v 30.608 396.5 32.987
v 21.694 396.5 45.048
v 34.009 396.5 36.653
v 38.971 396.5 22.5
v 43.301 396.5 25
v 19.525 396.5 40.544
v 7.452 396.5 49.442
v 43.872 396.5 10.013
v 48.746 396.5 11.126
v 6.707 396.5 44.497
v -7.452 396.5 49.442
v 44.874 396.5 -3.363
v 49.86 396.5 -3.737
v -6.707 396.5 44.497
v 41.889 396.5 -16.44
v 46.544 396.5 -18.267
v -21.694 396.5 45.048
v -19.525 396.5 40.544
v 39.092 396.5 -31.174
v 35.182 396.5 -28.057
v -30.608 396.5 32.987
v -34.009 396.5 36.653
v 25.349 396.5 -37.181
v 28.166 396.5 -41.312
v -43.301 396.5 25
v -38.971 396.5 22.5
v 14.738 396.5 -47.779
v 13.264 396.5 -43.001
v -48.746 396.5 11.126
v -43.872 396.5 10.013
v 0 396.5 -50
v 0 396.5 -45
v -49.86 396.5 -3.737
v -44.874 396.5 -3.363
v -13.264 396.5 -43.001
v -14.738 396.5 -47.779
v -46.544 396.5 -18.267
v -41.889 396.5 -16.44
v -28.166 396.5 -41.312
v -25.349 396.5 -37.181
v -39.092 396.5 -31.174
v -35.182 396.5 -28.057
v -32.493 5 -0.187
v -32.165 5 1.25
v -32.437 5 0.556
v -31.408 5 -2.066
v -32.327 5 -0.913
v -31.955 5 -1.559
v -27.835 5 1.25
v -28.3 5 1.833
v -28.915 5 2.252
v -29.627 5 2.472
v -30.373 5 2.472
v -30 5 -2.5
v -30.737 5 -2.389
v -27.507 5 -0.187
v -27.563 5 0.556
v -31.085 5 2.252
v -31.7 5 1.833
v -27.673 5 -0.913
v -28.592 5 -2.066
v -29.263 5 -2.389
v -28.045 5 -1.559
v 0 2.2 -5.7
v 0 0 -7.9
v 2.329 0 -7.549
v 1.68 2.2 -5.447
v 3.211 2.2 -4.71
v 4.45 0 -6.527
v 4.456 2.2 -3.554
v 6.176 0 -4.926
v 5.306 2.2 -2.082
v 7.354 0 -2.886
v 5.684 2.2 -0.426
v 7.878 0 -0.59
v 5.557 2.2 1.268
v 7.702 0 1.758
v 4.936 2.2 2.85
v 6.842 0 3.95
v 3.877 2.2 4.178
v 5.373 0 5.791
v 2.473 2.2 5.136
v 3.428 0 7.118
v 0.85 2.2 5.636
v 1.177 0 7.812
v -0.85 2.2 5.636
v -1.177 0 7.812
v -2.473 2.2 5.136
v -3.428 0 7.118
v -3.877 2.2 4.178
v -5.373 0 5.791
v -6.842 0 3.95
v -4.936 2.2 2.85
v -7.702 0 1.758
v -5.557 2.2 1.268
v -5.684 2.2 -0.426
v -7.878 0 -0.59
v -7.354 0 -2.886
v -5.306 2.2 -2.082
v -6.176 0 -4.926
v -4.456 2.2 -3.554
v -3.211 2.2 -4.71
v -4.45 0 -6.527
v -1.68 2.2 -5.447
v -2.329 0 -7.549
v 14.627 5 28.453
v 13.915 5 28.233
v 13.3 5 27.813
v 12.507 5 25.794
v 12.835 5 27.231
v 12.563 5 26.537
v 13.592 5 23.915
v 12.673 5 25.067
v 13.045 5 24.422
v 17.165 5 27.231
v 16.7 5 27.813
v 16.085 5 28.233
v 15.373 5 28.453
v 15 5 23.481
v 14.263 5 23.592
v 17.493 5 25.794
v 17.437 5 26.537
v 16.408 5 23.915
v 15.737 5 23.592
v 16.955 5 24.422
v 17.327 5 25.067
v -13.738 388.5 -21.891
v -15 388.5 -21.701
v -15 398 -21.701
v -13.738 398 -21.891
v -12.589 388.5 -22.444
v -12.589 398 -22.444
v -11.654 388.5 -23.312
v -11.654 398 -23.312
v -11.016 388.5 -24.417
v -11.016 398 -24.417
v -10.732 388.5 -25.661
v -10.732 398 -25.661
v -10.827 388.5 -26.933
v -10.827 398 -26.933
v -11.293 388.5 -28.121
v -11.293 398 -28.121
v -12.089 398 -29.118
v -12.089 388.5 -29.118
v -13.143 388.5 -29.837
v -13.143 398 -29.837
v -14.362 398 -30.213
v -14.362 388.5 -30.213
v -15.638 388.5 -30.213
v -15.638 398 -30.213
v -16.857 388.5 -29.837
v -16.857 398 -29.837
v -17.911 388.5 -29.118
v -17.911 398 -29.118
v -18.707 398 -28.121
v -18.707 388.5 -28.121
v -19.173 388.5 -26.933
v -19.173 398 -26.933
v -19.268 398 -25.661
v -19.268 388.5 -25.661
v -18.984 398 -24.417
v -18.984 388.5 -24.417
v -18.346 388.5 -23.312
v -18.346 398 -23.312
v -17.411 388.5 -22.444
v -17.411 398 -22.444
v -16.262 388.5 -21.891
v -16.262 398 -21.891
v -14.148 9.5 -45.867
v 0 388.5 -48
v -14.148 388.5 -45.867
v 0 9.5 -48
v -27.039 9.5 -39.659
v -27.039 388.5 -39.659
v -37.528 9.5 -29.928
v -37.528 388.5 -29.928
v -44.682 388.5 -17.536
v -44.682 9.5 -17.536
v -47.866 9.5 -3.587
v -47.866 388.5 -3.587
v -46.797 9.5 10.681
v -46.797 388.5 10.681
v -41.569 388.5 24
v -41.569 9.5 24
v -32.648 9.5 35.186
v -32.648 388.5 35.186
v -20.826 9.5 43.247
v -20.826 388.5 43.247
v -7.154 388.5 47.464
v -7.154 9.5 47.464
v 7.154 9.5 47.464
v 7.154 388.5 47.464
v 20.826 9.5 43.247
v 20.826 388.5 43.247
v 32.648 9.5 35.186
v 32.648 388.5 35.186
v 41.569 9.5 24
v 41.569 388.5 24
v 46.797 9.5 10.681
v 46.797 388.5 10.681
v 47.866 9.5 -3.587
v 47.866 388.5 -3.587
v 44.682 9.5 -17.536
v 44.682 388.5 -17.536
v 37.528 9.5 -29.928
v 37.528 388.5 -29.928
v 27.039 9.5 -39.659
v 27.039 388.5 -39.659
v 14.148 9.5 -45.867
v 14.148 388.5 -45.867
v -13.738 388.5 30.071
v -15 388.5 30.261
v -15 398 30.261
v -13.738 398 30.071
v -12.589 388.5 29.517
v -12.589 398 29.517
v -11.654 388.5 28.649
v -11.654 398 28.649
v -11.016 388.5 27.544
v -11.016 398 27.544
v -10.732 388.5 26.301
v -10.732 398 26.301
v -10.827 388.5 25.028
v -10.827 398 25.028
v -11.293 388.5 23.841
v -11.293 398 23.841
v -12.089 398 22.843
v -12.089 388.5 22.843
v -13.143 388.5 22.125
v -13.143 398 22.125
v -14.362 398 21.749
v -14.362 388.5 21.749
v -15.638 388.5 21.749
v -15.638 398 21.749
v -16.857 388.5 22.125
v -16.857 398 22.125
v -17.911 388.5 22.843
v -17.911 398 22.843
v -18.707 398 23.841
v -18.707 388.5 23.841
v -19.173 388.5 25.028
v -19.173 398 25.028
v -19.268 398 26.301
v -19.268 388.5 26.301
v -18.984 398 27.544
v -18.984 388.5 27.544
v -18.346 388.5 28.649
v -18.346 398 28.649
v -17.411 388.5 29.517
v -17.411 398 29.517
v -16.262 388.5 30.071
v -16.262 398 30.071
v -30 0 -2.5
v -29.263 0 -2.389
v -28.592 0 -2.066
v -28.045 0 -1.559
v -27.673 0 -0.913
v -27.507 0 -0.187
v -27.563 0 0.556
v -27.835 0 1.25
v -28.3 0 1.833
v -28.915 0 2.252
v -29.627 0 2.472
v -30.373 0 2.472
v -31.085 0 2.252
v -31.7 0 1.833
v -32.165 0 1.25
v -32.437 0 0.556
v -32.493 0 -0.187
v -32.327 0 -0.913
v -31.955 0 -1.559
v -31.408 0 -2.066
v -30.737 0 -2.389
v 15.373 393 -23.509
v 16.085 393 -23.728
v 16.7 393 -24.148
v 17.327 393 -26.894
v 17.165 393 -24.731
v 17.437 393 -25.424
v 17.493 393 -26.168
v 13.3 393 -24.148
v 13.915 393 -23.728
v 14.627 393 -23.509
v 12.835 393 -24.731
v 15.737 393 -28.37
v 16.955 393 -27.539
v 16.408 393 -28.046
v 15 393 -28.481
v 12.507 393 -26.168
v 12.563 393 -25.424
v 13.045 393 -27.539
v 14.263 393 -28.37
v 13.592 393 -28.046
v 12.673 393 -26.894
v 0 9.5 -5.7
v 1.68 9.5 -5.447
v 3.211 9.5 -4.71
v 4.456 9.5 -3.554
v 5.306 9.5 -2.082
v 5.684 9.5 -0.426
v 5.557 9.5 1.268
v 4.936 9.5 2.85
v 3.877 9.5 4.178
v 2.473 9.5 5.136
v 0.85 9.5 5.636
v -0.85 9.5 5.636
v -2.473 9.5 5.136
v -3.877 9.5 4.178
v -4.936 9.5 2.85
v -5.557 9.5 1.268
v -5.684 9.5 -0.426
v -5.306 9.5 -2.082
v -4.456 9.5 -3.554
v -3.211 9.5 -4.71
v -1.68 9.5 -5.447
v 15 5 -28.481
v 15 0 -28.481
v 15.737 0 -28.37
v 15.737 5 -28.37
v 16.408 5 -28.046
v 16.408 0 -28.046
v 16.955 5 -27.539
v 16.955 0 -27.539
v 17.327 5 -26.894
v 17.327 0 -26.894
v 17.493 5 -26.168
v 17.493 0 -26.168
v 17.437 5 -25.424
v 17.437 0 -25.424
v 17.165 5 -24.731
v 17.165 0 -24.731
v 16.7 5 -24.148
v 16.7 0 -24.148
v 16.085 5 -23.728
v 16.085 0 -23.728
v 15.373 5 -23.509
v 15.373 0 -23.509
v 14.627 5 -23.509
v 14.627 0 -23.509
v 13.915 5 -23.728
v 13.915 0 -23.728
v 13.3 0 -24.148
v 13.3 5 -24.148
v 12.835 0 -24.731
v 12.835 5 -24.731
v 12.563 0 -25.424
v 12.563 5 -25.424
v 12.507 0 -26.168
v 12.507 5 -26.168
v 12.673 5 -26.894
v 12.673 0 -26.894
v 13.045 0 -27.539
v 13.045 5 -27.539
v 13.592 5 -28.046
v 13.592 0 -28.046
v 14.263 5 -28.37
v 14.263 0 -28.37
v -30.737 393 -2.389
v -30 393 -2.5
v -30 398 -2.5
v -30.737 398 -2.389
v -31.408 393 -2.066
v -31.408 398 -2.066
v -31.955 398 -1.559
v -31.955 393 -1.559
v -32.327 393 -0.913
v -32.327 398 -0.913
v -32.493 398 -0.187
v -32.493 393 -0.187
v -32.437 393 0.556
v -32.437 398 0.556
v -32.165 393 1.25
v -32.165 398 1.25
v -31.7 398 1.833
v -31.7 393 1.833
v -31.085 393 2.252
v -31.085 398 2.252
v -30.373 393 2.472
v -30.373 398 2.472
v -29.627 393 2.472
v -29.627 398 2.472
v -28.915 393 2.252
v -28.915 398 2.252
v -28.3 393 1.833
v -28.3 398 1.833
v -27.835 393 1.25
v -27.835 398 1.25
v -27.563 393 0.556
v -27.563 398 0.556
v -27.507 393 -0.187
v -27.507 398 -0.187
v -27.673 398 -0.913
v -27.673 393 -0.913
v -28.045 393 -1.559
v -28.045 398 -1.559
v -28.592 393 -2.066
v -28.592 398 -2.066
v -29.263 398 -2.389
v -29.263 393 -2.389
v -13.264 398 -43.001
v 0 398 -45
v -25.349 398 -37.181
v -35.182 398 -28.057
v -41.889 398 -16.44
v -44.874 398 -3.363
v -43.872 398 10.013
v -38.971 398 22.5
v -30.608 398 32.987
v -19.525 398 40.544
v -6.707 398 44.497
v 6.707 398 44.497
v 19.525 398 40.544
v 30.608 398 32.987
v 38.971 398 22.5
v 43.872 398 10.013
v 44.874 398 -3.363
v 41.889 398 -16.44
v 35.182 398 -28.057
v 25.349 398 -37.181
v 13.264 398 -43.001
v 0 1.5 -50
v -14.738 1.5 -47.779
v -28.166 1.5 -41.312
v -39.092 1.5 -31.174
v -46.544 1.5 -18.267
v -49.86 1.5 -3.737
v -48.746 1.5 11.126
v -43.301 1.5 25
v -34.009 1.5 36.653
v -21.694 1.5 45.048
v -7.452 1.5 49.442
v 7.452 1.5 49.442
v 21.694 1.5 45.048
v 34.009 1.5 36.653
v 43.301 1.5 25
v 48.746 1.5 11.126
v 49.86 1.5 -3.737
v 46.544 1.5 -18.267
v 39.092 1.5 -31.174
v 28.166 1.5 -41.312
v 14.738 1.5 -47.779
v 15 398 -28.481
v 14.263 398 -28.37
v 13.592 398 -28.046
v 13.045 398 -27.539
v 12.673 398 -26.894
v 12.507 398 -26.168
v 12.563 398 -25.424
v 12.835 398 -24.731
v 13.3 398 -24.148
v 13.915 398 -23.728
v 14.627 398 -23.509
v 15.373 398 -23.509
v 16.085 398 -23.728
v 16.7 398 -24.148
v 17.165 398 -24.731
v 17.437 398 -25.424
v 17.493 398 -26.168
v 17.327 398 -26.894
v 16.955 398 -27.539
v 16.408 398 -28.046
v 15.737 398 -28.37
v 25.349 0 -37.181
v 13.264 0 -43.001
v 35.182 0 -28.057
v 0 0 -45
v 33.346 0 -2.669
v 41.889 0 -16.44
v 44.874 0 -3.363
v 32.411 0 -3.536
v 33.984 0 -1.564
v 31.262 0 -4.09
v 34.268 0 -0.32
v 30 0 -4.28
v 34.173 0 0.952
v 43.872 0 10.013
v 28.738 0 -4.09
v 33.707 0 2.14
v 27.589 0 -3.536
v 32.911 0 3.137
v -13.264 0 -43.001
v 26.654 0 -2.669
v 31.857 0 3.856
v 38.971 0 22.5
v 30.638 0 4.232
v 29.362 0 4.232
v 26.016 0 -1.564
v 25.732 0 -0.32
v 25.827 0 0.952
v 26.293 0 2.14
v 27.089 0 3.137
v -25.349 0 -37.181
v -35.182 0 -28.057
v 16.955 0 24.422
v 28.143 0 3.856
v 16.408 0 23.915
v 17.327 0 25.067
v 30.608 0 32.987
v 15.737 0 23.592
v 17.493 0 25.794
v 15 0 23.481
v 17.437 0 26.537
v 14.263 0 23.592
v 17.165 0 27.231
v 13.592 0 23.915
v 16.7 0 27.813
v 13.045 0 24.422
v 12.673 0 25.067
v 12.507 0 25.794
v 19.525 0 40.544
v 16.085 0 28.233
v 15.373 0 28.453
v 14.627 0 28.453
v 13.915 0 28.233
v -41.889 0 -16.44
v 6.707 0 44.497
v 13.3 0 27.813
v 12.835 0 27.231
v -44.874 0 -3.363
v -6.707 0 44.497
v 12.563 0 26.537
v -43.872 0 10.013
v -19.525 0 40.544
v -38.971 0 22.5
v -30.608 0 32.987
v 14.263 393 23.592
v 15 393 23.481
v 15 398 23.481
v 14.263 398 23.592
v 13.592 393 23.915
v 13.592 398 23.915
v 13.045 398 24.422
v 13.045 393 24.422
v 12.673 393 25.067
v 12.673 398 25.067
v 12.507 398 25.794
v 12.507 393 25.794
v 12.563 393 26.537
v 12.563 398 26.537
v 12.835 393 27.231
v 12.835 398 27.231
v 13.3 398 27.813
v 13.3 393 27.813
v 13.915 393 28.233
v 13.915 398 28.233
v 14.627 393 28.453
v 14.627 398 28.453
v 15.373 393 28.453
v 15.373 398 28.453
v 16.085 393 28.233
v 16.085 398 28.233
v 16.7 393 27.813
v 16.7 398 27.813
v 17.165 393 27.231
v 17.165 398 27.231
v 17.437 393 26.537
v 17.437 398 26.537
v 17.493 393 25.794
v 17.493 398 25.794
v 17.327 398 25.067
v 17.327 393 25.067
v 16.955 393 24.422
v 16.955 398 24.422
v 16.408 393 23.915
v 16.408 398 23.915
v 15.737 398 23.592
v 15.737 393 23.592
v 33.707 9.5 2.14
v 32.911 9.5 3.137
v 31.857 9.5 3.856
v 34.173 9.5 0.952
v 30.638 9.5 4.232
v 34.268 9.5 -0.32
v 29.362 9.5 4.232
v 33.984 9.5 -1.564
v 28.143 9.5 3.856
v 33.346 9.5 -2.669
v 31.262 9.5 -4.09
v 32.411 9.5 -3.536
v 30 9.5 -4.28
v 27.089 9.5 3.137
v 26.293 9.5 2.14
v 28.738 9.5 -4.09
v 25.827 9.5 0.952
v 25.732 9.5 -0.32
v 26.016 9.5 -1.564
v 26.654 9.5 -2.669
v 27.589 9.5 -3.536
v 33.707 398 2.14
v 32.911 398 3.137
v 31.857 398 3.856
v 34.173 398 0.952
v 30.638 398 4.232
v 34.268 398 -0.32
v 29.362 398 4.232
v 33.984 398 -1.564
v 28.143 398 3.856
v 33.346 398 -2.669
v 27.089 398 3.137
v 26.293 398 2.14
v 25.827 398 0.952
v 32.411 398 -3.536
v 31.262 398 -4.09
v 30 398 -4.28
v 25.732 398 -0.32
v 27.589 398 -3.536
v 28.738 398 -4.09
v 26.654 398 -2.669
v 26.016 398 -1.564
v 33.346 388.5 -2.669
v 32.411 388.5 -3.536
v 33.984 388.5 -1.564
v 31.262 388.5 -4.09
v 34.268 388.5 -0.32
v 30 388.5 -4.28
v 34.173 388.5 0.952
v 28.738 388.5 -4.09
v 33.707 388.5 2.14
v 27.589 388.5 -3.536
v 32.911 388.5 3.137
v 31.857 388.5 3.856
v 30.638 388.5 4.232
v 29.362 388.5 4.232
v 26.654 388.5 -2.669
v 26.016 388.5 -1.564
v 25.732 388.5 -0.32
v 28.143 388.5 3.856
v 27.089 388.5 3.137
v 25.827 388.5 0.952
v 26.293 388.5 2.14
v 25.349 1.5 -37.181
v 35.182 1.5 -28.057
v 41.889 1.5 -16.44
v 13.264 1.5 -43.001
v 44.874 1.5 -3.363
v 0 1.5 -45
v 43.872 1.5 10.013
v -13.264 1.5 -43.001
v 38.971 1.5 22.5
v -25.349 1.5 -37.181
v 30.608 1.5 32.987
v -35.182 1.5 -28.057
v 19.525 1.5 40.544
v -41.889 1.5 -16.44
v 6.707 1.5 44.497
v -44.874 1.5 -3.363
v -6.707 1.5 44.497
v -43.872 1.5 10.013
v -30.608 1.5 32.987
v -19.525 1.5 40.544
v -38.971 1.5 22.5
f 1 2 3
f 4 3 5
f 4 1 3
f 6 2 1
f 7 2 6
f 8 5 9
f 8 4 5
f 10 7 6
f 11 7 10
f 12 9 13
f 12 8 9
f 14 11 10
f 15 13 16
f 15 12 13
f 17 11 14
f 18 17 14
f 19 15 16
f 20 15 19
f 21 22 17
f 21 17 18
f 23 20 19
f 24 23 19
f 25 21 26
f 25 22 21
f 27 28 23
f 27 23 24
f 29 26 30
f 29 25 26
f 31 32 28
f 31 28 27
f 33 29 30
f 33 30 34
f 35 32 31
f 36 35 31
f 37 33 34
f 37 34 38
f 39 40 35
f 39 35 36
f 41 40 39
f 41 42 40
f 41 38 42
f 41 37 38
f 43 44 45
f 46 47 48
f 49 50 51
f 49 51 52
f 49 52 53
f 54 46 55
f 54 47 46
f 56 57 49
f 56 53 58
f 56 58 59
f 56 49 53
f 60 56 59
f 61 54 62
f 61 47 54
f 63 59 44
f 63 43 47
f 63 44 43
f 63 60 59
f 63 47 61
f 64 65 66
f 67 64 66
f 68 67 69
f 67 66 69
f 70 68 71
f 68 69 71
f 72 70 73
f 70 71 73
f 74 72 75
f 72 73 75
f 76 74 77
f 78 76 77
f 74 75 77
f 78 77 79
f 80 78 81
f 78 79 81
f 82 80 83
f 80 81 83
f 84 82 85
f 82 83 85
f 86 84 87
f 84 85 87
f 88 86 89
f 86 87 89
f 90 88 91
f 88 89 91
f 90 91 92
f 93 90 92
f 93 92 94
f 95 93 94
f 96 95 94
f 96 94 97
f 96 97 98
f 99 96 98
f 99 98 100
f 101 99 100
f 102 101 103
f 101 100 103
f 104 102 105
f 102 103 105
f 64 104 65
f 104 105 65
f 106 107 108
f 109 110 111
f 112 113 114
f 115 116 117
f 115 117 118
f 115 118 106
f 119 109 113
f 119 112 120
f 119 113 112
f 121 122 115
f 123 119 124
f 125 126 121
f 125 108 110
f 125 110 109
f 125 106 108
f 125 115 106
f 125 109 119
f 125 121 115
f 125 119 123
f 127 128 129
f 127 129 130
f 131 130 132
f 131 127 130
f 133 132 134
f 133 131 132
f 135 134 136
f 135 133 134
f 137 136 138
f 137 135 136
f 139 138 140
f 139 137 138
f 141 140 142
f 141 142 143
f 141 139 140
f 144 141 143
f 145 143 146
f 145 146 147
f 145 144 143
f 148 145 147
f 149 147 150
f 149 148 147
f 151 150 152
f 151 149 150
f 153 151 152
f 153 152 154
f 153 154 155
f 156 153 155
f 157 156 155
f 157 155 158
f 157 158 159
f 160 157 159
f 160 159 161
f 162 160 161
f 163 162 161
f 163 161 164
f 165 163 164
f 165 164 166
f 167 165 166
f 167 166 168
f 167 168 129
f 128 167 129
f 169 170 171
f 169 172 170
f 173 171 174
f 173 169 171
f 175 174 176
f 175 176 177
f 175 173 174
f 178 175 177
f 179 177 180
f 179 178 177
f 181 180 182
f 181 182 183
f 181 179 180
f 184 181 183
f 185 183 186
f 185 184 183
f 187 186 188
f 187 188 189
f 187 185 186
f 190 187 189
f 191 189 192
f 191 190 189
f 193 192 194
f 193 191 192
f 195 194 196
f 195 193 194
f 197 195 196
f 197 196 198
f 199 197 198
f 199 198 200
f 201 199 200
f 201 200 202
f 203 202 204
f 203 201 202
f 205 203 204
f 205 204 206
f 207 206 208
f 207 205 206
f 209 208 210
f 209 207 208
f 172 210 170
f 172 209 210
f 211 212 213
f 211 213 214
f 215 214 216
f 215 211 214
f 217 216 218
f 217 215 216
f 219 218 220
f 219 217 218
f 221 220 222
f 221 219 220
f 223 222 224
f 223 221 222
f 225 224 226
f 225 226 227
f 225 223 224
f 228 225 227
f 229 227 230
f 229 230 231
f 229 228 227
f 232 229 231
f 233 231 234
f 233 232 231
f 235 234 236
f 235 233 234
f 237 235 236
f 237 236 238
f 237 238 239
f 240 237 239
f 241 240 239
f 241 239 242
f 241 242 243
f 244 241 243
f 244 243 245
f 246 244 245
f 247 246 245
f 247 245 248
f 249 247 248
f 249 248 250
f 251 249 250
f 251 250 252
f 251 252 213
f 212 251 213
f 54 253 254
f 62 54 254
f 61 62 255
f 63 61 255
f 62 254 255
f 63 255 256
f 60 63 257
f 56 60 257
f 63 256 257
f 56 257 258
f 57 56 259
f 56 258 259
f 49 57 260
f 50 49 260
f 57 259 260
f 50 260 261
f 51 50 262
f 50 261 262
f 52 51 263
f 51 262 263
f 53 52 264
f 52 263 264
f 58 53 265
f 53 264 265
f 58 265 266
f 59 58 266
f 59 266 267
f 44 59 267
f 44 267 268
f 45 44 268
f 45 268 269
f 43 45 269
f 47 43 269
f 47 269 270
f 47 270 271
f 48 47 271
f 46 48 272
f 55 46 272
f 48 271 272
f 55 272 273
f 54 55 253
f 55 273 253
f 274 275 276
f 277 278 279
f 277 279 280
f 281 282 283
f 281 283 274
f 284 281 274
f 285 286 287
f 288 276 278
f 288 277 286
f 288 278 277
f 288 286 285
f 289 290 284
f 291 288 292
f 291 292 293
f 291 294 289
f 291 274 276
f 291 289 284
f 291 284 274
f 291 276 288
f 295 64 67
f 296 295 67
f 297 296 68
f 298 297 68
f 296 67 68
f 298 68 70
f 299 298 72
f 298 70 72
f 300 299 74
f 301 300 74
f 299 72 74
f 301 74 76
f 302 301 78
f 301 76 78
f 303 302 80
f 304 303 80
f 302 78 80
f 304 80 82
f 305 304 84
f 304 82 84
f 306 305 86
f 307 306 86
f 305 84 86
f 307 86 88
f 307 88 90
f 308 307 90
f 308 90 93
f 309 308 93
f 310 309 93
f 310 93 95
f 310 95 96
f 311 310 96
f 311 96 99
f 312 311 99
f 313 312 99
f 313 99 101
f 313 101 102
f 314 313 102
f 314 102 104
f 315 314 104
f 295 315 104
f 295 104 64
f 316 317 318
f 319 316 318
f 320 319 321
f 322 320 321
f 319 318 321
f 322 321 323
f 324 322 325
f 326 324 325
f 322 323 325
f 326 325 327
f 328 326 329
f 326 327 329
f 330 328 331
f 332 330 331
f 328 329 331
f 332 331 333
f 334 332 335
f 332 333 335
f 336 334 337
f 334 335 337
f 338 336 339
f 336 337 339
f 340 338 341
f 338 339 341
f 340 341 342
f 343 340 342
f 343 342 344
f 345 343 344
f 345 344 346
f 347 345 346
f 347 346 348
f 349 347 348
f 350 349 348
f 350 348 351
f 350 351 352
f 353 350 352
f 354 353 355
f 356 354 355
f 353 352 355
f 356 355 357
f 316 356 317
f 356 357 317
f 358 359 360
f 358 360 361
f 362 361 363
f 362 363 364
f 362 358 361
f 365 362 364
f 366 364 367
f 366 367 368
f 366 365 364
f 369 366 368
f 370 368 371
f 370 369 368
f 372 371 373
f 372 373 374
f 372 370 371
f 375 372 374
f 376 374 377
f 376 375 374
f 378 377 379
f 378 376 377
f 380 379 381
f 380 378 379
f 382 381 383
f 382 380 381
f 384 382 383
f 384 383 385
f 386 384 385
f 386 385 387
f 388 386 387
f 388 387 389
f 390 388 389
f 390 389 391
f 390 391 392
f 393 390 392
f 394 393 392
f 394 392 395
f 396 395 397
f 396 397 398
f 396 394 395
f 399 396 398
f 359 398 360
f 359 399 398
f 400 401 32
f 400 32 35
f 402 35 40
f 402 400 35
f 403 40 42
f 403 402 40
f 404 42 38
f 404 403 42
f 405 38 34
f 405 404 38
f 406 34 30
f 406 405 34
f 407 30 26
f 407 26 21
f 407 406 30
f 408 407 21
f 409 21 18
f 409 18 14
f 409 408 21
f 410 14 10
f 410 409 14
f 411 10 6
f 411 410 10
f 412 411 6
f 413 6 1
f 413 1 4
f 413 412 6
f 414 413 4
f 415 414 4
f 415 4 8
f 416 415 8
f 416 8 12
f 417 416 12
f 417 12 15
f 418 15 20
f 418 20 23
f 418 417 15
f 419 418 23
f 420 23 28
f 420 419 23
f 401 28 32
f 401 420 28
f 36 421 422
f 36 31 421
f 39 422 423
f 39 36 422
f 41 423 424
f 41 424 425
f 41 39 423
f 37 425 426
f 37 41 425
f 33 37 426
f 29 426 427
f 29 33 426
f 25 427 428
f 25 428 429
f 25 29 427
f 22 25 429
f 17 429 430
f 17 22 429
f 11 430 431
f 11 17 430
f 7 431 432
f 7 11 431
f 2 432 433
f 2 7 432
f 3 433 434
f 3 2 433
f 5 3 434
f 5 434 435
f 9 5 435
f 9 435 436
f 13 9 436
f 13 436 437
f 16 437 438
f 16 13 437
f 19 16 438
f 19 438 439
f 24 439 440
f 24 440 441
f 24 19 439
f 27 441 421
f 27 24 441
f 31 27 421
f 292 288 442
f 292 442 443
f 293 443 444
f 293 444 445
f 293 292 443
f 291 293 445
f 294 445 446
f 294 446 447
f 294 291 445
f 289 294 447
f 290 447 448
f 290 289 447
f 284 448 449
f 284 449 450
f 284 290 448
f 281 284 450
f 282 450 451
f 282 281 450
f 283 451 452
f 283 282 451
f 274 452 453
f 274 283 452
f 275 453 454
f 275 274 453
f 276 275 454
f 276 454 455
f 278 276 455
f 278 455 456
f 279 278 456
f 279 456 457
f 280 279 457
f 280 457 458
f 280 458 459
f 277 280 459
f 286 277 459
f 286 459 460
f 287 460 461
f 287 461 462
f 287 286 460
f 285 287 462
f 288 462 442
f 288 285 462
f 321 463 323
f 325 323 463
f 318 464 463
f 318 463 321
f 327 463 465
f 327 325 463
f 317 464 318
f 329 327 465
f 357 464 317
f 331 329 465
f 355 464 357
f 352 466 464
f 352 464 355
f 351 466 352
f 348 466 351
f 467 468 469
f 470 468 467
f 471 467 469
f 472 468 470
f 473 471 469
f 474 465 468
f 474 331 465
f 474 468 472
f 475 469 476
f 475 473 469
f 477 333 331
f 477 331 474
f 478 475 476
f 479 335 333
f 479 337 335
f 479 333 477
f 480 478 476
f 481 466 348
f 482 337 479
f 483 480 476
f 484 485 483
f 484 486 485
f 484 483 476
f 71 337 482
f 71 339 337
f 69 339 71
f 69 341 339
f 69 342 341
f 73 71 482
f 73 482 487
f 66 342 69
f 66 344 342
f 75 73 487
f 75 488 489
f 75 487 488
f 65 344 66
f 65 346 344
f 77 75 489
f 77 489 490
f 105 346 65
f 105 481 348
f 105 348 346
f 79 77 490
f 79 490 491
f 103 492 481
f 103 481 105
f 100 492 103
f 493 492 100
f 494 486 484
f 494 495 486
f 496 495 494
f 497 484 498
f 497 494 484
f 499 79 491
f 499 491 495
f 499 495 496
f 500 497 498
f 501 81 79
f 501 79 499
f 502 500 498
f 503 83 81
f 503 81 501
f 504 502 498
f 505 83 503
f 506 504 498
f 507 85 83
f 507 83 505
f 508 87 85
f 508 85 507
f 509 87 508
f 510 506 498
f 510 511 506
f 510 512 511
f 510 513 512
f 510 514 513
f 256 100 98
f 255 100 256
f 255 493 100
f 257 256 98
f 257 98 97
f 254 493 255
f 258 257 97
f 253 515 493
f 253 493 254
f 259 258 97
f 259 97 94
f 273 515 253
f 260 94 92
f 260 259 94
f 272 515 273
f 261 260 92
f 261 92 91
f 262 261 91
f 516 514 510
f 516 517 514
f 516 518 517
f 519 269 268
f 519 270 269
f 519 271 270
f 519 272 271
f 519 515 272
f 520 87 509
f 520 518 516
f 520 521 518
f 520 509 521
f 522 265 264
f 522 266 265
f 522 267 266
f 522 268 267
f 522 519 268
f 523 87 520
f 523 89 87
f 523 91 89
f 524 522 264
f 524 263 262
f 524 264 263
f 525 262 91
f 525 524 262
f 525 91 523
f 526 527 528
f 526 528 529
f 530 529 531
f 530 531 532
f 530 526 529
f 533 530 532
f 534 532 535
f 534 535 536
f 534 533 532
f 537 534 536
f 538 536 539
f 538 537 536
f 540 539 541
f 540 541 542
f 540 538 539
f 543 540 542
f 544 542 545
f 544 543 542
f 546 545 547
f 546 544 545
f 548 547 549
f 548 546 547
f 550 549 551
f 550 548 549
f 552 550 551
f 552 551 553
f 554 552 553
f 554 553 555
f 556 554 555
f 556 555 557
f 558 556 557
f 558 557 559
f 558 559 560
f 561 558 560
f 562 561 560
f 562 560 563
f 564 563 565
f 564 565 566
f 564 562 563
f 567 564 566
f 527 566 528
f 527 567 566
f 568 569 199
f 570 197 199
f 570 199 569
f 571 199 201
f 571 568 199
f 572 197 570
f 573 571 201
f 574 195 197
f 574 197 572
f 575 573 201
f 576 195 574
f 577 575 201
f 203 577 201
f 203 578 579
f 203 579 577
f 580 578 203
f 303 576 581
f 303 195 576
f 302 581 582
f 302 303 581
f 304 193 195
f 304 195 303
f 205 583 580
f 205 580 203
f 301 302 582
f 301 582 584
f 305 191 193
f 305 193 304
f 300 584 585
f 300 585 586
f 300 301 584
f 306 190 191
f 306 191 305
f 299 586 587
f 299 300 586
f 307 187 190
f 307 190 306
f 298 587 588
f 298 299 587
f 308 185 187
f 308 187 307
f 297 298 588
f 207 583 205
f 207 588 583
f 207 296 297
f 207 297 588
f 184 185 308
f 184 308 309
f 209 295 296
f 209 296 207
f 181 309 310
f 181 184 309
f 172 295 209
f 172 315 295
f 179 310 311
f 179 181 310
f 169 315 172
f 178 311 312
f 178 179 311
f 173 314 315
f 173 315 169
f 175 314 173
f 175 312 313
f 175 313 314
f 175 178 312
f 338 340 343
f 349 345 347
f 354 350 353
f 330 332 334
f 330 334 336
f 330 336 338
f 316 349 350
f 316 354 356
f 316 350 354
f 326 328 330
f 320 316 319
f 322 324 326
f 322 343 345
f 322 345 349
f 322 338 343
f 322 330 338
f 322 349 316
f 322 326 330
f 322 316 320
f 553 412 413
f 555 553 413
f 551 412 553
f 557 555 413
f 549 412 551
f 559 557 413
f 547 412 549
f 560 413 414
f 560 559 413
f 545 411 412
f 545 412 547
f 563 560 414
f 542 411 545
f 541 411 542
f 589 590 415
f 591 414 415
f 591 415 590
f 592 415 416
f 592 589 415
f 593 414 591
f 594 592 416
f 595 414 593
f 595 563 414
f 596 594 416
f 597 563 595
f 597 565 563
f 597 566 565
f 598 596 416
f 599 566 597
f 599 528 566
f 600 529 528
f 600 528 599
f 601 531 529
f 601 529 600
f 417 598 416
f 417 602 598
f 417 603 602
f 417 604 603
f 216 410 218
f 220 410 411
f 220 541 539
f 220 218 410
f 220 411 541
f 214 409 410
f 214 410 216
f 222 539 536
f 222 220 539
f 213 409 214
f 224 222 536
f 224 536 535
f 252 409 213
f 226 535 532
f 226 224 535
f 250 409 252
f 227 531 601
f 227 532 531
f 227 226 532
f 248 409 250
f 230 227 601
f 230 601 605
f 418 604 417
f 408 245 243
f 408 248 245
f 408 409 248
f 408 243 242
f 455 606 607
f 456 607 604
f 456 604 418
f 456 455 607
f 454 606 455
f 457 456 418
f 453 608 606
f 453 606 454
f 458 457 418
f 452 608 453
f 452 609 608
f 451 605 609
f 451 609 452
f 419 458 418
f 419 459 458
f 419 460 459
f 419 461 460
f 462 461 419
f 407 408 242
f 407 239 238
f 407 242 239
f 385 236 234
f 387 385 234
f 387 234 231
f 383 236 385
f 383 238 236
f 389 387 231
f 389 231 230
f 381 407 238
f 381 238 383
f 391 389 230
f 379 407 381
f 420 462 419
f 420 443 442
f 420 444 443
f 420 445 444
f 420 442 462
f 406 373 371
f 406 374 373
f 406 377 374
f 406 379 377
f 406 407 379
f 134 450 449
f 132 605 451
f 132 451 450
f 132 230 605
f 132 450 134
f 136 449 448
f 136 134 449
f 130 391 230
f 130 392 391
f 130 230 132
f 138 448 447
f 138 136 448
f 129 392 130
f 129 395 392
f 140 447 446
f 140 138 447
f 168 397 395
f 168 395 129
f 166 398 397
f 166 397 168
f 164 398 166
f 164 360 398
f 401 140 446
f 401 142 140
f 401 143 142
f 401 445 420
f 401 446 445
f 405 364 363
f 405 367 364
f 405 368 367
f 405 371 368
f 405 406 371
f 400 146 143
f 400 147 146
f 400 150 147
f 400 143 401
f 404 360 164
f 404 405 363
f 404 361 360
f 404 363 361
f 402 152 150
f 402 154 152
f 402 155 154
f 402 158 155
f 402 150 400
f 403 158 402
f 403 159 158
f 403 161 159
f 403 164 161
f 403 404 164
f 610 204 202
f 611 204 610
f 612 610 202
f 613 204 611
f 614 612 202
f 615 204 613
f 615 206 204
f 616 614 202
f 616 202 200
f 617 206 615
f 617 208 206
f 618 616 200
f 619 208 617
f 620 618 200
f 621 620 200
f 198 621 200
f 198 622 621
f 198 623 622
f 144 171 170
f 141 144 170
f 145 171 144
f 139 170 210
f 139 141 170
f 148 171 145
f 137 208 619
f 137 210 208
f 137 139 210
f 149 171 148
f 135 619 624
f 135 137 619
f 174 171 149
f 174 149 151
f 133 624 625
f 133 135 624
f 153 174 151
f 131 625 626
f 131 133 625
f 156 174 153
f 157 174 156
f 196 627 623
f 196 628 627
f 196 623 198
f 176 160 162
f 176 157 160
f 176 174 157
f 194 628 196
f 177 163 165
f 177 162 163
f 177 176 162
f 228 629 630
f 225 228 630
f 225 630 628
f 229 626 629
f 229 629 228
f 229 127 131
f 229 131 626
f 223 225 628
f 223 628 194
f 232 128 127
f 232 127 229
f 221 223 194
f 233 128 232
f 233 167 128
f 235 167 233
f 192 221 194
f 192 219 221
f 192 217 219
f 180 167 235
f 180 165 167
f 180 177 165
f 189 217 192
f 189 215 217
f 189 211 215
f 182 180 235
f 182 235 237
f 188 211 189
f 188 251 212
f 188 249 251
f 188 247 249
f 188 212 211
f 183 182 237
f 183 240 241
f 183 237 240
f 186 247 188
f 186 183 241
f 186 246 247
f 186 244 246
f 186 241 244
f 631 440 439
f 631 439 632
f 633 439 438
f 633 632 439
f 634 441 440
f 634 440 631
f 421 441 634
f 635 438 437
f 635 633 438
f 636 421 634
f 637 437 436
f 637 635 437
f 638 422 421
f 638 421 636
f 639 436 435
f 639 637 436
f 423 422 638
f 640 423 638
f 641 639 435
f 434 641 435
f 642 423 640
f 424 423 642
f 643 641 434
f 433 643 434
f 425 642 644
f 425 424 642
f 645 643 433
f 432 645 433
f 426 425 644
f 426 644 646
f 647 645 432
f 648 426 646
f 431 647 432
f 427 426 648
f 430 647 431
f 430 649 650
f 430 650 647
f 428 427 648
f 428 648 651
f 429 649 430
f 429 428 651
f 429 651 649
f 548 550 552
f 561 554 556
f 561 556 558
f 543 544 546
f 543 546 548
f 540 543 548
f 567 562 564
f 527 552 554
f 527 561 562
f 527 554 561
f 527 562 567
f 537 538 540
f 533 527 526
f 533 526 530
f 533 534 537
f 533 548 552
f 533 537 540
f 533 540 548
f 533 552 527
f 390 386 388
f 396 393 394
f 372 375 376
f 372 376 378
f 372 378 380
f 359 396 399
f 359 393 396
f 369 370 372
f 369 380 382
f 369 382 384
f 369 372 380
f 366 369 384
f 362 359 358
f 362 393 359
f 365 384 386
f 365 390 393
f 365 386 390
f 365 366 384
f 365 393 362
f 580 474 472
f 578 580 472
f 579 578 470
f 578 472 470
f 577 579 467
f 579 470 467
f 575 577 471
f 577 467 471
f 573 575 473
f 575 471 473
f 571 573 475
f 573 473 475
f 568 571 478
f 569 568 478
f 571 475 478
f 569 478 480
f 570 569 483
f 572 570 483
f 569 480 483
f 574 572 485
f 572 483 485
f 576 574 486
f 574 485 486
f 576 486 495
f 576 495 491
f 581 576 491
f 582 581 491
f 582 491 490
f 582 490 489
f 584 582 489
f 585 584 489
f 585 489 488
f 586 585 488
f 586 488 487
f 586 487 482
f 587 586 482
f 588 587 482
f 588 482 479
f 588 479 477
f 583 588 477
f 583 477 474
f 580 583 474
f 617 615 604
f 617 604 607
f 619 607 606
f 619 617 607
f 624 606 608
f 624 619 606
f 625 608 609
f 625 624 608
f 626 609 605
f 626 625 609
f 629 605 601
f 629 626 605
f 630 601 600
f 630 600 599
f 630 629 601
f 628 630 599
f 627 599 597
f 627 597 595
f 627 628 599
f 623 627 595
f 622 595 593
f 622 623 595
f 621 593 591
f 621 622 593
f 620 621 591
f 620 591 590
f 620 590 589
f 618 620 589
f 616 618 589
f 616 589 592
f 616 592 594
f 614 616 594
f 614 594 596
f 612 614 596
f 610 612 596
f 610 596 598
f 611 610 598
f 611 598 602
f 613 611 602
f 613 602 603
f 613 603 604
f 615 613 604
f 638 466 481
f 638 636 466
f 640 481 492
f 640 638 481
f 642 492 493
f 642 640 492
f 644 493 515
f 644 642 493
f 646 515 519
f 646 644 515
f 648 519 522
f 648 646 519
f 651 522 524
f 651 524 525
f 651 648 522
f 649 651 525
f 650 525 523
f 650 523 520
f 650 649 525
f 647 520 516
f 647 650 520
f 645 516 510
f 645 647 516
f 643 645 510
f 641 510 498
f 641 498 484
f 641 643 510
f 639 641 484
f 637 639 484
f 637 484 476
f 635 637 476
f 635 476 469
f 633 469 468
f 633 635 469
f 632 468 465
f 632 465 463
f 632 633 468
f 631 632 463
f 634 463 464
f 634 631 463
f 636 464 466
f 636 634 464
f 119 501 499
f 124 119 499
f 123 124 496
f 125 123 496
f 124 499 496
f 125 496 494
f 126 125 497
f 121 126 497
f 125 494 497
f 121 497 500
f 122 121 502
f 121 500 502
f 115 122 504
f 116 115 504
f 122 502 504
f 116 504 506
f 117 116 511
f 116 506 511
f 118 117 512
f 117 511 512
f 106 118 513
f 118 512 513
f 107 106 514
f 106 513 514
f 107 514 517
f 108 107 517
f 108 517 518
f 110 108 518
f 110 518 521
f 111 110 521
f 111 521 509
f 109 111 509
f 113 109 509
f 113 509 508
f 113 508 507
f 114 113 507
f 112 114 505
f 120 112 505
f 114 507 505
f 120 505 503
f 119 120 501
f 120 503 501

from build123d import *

# Parameters (mm, degrees)
SKETCH_5_R          = 5.7
SKETCH_5_R_2        = 4.28
CUT_EXTRUDE_4_DEPTH = 33
SKETCH_6_R          = 2.5
CUT_EXTRUDE_5_DEPTH = 5
CHAMFER_2_SIZE      = 2.2
EXTRUDE_START       = 1.5
SKETCH_7_R          = 45
EXTRUDE_1_DEPTH     = 1.5
CUT_EXTRUDE_START   = -5
SKETCH_8_R          = 2.5
CUT_EXTRUDE_6_DEPTH = 5
CUT_EXTRUDE_START_2 = -85
SKETCH_9_R          = 4.28
CUT_EXTRUDE_7_DEPTH = 85


with BuildPart() as part:
    # Эскиз2 → Повернуть2 (revolve)
    with BuildSketch(Plane(origin=(0, 0, 0), x_dir=(0, 0, -1), z_dir=(1, 0, 0))):
        Polygon((45, 1.5), (50, 1.5), (50, 396.5), (0, 396.5), (0, 388.5), (48, 388.5), (48, 9.5), (0, 9.5), (0, 0), (45, 0), align=None)
    revolve(axis=Axis((0, 0, 0), (0, 1, 0)))

    # Эскиз5 → Вырез-Вытянуть4 (cut)
    with BuildSketch(Plane.XZ):
        with Locations(Location((0, 0, 0), (0, 0, 270))):
            Circle(SKETCH_5_R)
        with Locations(Location((30, 0, 0), (0, 0, 270))):
            Circle(SKETCH_5_R_2)
    extrude(amount=-CUT_EXTRUDE_4_DEPTH, mode=Mode.SUBTRACT)

    # Эскиз6 → Вырез-Вытянуть5 (cut)
    with BuildSketch(Plane.XZ):
        with Locations(Location((-30, 0, 0), (0, 0, 270))):
            Circle(SKETCH_6_R)
        with Locations(Location((15, 25.980762114, 0), (0, 0, 270))):
            Circle(SKETCH_6_R)
        with Locations(Location((15, -25.980762114, 0), (0, 0, 270))):
            Circle(SKETCH_6_R)
    extrude(amount=-CUT_EXTRUDE_5_DEPTH, mode=Mode.SUBTRACT)

    # Фаска2
    chamfer_2_edges = [part.edges().sort_by_distance(p)[0] for p in [
        (0, 0, 5.7),
    ]]
    chamfer(chamfer_2_edges, length=CHAMFER_2_SIZE)

    # Эскиз7 → Бобышка-Вытянуть1 (add)
    with BuildSketch(Plane(origin=(0, 396.5, 0), x_dir=(1, 0, 0), z_dir=(0, 1, 0)).offset(EXTRUDE_START)):
        with Locations(Location((0, 0, 0), (0, 0, 90))):
            Circle(SKETCH_7_R)
    extrude(amount=-EXTRUDE_1_DEPTH)

    # Эскиз8 → Вырез-Вытянуть6 (cut)
    with BuildSketch(Plane(origin=(0, 398, 0), x_dir=(1, 0, 0), z_dir=(0, 1, 0)).offset(CUT_EXTRUDE_START)):
        with Locations(Location((-30, 0, 0), (0, 0, 90))):
            Circle(SKETCH_8_R)
        with Locations(Location((15, 25.980762114, 0), (0, 0, 90))):
            Circle(SKETCH_8_R)
        with Locations(Location((15, -25.980762114, 0), (0, 0, 90))):
            Circle(SKETCH_8_R)
    extrude(amount=CUT_EXTRUDE_6_DEPTH, mode=Mode.SUBTRACT)

    # Эскиз9 → Вырез-Вытянуть7 (cut)
    with BuildSketch(Plane(origin=(0, 398, 0), x_dir=(1, 0, 0), z_dir=(0, 1, 0)).offset(CUT_EXTRUDE_START_2)):
        with Locations(Location((30, 0, 0), (0, 0, 90))):
            Circle(SKETCH_9_R)
        with Locations(Location((-15, -25.980762114, 0), (0, 0, 270))):
            Circle(SKETCH_9_R)
        with Locations(Location((-15, 25.980762114, 0), (0, 0, 270))):
            Circle(SKETCH_9_R)
    extrude(amount=CUT_EXTRUDE_7_DEPTH, mode=Mode.SUBTRACT)


solid = part.part
